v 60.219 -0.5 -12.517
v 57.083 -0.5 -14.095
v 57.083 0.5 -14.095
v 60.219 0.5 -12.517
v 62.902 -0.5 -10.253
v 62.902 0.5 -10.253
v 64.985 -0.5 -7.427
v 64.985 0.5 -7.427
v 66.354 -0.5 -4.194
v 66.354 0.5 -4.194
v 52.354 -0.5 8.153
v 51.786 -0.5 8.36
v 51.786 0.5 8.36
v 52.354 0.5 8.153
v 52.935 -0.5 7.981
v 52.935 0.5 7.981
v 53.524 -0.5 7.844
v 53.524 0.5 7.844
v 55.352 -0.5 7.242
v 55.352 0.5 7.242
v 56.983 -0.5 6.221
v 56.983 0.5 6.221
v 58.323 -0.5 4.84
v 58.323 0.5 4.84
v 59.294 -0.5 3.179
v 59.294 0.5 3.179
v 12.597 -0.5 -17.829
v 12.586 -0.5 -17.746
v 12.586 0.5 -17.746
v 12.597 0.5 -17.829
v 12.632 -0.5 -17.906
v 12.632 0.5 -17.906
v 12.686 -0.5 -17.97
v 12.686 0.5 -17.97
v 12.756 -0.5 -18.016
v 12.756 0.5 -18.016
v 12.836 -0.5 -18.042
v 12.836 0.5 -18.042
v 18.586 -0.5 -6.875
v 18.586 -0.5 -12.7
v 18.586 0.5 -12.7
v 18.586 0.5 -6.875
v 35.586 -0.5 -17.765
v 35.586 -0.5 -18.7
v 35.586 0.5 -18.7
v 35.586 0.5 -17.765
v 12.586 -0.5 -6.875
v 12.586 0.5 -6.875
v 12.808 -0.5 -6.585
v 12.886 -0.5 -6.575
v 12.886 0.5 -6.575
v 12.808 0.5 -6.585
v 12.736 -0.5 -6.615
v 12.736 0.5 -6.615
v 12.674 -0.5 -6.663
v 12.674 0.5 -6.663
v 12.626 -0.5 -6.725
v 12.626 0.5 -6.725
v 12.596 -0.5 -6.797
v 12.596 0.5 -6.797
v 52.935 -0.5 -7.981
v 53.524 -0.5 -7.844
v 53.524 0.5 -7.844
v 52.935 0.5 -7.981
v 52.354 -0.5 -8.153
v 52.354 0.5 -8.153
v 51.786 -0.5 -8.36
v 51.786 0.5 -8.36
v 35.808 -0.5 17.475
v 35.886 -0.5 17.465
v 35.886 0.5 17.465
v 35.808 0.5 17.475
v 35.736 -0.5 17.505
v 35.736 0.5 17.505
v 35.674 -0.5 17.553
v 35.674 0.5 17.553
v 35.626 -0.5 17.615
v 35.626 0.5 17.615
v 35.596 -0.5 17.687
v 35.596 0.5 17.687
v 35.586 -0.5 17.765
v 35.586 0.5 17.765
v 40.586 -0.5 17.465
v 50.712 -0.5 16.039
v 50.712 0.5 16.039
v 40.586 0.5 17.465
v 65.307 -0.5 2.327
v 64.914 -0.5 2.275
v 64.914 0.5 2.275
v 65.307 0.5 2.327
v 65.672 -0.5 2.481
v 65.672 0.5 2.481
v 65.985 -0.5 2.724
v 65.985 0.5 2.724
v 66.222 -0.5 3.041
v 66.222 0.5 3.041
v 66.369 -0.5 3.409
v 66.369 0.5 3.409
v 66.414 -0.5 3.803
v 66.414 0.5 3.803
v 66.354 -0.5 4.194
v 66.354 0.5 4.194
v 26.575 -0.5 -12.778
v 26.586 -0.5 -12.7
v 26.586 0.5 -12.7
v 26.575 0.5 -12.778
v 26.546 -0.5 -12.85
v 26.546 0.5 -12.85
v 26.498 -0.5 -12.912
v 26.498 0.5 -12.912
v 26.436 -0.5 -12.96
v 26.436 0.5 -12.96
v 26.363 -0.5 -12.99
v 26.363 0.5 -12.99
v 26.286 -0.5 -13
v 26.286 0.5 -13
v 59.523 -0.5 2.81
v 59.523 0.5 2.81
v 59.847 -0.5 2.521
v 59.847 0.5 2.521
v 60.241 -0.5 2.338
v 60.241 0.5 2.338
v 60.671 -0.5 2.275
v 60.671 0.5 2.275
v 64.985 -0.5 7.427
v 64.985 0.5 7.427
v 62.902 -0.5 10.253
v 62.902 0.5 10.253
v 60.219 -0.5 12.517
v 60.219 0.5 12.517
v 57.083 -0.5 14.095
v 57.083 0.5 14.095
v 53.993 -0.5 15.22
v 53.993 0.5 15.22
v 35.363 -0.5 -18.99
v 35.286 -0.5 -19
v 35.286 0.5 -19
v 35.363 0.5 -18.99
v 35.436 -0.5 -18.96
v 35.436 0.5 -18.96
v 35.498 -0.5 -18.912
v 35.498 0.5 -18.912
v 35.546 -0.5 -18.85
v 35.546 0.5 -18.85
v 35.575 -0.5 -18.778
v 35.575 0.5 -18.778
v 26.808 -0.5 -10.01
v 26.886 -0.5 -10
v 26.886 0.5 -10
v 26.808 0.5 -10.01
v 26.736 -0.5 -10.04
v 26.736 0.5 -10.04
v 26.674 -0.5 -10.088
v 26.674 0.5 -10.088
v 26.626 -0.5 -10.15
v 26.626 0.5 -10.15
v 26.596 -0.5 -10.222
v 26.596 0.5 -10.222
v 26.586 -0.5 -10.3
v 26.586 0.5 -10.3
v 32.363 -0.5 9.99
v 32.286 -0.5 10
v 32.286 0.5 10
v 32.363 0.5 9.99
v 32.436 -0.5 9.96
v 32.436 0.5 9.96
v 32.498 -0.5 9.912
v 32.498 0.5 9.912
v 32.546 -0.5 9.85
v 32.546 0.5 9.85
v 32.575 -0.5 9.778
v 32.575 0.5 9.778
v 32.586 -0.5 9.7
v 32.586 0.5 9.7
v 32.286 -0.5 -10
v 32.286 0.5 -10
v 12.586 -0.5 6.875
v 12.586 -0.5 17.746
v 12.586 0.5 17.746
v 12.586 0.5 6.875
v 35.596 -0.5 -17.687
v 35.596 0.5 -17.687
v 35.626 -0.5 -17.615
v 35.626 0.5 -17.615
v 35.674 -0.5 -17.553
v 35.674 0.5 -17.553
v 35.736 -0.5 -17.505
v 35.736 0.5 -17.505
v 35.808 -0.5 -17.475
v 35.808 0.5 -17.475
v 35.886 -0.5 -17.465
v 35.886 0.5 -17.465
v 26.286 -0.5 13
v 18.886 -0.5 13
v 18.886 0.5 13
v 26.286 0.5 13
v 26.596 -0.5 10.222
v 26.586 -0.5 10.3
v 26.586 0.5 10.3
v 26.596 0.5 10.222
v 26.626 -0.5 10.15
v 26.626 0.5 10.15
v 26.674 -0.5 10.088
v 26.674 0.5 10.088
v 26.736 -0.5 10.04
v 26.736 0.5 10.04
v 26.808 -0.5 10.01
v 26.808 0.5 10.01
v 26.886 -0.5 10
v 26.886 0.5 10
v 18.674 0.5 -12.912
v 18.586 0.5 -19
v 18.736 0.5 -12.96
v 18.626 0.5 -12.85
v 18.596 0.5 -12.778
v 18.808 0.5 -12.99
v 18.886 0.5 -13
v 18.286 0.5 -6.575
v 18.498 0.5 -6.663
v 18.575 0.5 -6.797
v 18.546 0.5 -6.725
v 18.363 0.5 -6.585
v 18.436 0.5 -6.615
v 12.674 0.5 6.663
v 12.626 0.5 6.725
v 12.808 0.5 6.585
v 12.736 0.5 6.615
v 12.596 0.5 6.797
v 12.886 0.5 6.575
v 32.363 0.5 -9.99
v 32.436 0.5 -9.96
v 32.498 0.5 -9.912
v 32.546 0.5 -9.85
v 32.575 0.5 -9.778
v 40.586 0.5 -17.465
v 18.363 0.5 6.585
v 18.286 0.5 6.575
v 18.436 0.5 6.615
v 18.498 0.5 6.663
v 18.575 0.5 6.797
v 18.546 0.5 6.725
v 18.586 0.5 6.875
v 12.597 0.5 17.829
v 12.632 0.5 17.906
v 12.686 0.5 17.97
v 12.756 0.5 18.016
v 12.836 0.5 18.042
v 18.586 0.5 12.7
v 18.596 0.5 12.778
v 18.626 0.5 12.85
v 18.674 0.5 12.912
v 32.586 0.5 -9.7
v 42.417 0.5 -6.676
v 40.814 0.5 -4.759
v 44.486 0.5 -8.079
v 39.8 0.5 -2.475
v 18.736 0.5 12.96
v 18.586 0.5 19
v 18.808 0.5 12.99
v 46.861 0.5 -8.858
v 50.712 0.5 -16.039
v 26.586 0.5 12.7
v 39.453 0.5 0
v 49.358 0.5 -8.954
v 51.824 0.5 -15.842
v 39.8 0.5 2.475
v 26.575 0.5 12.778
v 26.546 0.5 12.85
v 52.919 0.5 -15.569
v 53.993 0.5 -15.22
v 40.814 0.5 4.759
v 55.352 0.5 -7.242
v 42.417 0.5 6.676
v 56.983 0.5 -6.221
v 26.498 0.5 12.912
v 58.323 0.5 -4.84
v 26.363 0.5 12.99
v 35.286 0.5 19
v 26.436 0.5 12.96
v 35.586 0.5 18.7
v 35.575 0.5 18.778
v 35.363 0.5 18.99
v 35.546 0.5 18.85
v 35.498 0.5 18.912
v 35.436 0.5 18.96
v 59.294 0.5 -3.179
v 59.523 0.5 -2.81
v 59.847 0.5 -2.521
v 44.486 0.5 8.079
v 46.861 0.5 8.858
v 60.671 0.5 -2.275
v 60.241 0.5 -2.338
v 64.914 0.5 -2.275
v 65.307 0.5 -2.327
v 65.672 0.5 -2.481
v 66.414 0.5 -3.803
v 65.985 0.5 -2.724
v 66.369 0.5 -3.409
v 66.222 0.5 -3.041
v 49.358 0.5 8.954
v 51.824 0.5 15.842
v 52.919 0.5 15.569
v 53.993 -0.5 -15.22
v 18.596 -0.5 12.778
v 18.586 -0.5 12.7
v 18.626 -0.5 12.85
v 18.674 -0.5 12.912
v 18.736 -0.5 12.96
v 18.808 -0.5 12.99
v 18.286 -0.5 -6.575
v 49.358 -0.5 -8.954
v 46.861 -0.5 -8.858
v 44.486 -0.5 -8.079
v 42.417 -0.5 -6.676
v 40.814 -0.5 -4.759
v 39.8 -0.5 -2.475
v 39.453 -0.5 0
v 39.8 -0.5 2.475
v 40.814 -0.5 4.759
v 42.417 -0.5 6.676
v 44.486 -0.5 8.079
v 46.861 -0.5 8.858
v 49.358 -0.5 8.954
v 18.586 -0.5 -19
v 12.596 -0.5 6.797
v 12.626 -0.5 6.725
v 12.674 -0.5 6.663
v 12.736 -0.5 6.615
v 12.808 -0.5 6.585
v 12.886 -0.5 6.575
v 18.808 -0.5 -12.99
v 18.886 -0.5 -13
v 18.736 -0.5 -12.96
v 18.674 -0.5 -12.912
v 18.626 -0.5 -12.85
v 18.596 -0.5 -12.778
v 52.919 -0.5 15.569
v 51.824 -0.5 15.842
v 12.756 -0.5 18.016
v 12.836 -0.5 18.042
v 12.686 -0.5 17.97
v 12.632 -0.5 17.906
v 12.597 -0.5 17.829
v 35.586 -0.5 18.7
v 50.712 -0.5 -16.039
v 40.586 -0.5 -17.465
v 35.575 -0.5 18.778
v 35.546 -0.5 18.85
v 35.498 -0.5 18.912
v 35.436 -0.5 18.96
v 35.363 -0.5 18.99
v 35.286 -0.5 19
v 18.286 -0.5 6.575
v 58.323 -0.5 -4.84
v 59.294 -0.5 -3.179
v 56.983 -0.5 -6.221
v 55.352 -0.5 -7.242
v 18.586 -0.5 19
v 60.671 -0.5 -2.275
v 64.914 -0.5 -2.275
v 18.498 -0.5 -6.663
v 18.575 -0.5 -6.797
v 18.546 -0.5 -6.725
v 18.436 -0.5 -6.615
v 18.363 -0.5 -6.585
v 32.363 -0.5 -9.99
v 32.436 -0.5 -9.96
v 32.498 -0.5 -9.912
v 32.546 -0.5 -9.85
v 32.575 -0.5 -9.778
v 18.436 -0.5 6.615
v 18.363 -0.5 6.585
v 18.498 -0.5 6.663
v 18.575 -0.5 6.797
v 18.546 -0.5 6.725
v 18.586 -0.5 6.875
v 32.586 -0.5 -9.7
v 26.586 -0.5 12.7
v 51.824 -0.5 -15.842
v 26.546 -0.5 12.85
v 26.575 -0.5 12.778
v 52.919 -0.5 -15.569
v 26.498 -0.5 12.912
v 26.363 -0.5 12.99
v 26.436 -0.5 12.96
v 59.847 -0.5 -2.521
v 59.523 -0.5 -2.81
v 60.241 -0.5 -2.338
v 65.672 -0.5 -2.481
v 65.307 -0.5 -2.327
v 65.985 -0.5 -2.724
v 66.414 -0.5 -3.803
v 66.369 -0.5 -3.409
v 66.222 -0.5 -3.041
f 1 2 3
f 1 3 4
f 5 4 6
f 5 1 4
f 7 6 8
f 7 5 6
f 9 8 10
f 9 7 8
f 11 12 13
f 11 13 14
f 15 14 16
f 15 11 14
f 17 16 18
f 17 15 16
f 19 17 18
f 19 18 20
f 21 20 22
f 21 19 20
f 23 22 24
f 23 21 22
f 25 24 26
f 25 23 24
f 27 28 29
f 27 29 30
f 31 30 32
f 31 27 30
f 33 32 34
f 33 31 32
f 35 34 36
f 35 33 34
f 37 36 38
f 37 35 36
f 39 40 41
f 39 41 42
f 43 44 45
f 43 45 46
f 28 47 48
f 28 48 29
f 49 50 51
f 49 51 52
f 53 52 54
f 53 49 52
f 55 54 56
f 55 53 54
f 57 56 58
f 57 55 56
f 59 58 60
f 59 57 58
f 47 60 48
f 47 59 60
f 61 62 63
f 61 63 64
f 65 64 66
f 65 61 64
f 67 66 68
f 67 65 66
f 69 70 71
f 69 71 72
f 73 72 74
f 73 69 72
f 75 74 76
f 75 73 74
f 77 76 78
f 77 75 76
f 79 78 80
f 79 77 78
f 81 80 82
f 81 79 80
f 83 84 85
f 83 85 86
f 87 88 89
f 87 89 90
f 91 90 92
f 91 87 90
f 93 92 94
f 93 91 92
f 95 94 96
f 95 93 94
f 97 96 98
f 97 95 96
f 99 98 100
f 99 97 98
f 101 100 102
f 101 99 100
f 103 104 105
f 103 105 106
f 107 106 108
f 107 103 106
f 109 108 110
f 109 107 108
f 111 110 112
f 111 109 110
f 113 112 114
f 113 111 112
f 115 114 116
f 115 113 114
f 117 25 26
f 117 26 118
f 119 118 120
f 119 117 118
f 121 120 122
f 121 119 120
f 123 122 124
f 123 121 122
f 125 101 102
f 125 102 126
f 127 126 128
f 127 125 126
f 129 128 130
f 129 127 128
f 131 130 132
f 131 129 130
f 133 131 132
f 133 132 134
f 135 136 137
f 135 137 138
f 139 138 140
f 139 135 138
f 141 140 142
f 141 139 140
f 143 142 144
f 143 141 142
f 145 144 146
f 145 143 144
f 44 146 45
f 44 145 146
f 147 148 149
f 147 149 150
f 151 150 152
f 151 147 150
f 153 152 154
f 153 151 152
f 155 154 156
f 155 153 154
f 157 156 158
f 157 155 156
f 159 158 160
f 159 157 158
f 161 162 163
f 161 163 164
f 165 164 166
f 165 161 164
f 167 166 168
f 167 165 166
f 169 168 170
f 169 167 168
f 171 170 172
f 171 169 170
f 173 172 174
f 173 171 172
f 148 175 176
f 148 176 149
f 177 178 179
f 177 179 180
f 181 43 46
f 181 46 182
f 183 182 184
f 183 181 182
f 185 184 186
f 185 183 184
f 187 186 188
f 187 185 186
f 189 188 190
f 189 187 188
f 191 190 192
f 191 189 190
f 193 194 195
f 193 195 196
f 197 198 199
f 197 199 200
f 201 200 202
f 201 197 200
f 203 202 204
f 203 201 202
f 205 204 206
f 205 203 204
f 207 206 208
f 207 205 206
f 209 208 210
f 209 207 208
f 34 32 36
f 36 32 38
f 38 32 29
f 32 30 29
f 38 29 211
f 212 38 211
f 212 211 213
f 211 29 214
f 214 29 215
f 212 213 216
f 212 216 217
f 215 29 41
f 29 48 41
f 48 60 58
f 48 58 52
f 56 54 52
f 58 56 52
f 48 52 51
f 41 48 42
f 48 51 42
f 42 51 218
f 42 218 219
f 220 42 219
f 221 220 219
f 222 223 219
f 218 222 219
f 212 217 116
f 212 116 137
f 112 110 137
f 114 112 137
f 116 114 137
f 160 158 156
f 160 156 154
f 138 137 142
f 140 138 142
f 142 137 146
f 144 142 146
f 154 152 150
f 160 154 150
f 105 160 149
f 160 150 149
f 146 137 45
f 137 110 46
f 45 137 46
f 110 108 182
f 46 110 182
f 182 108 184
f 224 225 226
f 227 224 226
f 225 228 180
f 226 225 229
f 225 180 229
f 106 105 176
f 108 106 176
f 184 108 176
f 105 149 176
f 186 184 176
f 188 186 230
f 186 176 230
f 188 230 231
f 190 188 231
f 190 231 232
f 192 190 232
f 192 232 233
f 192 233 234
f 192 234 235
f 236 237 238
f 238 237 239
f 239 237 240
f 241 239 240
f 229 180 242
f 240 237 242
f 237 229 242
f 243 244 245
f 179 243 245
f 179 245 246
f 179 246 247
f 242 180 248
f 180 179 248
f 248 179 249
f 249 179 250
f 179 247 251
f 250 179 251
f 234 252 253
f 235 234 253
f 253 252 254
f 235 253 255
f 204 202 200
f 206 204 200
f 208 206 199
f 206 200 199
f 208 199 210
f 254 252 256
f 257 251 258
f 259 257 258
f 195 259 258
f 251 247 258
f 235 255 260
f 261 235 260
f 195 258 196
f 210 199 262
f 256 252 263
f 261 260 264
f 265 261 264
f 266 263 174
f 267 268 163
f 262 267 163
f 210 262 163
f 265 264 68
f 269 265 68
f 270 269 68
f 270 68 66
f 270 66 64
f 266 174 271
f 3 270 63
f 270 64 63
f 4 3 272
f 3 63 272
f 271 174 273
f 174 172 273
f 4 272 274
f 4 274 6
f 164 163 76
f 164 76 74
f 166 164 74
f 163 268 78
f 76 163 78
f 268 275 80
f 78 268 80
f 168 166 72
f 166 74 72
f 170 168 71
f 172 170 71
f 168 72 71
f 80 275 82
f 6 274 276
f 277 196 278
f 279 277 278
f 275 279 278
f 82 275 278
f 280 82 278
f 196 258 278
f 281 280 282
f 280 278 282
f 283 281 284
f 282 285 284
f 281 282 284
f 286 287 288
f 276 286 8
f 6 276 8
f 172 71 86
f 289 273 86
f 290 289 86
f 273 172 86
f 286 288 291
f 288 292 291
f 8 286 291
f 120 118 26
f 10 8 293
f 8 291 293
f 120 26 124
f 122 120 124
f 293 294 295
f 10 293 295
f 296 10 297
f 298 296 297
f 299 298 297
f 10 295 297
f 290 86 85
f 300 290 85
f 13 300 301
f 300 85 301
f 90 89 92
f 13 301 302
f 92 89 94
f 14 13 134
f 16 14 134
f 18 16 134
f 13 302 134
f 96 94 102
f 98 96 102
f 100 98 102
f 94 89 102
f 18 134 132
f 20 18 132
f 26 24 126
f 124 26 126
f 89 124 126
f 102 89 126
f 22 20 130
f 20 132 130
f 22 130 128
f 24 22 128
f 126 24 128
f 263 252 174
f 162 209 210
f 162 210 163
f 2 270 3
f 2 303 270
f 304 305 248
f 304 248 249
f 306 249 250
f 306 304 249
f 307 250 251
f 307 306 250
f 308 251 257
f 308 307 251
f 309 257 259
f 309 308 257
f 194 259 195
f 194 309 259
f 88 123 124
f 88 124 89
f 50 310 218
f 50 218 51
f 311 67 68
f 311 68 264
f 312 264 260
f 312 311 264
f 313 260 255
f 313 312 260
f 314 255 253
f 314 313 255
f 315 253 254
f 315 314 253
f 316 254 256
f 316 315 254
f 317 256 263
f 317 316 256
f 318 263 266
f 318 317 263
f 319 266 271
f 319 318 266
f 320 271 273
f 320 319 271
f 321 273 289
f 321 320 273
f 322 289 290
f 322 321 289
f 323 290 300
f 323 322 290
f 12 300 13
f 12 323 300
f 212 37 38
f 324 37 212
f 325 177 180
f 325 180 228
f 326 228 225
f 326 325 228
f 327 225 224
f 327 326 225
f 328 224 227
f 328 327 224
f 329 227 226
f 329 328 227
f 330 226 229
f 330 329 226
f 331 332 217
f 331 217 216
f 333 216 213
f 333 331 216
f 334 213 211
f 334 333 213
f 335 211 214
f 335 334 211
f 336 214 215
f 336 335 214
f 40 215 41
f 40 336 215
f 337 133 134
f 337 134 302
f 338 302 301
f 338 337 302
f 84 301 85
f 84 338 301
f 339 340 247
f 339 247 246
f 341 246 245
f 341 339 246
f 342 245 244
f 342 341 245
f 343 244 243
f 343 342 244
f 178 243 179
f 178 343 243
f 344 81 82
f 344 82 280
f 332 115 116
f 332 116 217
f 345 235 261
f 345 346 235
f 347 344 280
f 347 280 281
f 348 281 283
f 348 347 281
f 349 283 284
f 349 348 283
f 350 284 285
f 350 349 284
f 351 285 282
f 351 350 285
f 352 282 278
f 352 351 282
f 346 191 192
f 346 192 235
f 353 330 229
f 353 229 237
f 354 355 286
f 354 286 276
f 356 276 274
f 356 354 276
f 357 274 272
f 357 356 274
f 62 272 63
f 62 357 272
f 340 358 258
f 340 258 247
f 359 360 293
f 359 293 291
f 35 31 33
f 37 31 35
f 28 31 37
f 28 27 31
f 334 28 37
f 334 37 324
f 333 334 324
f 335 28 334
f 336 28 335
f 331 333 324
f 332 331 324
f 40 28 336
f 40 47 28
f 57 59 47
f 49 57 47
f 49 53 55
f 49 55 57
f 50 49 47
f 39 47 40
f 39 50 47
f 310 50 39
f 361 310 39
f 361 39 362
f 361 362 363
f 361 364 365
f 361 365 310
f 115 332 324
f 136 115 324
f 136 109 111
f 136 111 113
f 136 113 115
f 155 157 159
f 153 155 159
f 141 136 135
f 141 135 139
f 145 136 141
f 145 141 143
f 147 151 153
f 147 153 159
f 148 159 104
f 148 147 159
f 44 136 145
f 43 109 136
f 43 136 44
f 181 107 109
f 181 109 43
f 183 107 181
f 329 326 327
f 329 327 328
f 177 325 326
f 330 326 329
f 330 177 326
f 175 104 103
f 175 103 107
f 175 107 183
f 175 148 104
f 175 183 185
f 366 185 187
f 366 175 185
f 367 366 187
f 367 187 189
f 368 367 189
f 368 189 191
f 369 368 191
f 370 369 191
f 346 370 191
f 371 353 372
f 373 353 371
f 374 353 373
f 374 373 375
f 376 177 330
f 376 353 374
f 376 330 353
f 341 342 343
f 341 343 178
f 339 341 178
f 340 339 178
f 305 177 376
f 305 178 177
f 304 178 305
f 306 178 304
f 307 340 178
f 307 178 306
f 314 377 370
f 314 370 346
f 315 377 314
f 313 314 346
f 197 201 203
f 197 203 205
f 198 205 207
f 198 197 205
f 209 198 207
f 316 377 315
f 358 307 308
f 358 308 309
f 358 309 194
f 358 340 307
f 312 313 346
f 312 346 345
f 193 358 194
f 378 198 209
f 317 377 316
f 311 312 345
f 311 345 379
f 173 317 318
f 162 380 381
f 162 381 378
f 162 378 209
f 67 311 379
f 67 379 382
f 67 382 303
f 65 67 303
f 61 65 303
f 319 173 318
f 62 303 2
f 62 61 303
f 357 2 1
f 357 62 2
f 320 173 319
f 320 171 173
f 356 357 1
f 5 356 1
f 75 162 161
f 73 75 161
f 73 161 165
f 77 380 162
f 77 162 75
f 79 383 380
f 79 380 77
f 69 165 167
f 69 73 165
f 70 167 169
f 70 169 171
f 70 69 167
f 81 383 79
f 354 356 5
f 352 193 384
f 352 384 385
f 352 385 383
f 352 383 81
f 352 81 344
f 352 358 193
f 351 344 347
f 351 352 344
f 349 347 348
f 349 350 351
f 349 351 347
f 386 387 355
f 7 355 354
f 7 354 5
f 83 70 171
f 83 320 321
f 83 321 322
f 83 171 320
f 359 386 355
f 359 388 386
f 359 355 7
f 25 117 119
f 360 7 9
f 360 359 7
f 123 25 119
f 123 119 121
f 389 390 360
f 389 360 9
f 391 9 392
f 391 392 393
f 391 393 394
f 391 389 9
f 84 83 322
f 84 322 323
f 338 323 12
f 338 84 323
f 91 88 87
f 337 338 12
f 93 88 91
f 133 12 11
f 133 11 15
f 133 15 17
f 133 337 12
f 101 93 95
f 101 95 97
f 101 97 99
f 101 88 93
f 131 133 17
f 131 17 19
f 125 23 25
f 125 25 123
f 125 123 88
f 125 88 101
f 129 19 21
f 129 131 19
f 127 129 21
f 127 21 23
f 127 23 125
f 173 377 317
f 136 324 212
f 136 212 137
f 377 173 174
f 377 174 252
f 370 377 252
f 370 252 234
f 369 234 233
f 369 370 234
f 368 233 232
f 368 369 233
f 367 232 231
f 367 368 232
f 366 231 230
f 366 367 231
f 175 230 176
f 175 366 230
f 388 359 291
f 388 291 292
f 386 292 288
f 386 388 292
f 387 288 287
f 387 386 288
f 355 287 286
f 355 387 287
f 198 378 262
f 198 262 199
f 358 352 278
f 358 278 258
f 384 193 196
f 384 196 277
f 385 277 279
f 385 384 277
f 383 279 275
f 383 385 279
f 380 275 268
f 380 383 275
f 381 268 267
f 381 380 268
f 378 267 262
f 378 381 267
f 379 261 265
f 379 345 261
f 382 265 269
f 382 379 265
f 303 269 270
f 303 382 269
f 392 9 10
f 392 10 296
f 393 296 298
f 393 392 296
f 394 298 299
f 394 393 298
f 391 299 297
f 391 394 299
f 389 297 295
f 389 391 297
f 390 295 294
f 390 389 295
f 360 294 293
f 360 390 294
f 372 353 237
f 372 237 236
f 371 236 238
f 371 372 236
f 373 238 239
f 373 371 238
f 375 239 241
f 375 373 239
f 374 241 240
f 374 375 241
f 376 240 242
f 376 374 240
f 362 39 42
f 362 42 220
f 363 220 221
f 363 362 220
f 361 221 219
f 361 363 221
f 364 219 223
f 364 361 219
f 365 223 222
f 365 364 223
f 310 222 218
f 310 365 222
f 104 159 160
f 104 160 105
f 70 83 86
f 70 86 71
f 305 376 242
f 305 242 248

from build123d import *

# Parameters (mm, degrees)
F1_DEPTH = 0.5


# Not quite as in the source:
# - ends of sketch curves that miss each other by under 0.0002 mm in the source are joined


with BuildPart() as f1:
    # F0 (on Front) → F1 (new body, symmetric)
    with BuildSketch(Plane.XZ):
        with BuildLine():
            Line((53.992555, -15.220268), (57.083133, -14.095389))
            ThreePointArc((57.083133, -14.095389), (62.9018568836, -10.252747544), (66.3544503107, -4.1944440905))
            ThreePointArc((66.3544503107, -4.1944440905), (66.1141142416, -2.8747683688), (64.914288, -2.275))
            Line((64.914288, -2.275), (60.670593, -2.275))
            ThreePointArc((60.670593, -2.275), (59.8472095147, -2.5211899521), (59.2941043505, -3.1789471518))
            ThreePointArc((59.2941043505, -3.1789471518), (56.9827494729, -6.2209259886), (53.52425904, -7.8441451998))
            ThreePointArc((53.52425904, -7.8441451998), (52.6431740995, -8.0626756758), (51.7855370008, -8.3602070021))
            ThreePointArc((51.7855370008, -8.3602070021), (39.452831, 0), (51.7855371982, 8.3602074972))
            ThreePointArc((51.7855371982, 8.3602074972), (52.6431743712, 8.0626765952), (53.524259133, 7.844145664))
            ThreePointArc((53.524259133, 7.844145664), (56.9827494729, 6.2209259886), (59.2941043849, 3.1789471667))
            ThreePointArc((59.2941043849, 3.1789471667), (59.8472095147, 2.5211899521), (60.670593, 2.275))
            Line((60.670593, 2.275), (64.914288, 2.275))
            ThreePointArc((64.914288, 2.275), (66.1141145297, 2.8747687527), (66.3544497778, 4.1944449353))
            ThreePointArc((66.3544497778, 4.1944449353), (62.9018565554, 10.2527478944), (57.0831331177, 14.0953893235))
            Line((57.0831331177, 14.0953893235), (53.992555, 15.220268))
            ThreePointArc((53.992555, 15.220268), (52.3736165632, 15.715360306), (50.7118440801, 16.0387645685))
            Line((50.7118440801, 16.0387645685), (40.585713, 17.465))
            Line((40.585713, 17.465), (35.885713, 17.465))
            ThreePointArc((35.885713, 17.465), (35.6735809656, 17.5528679656), (35.585713, 17.765))
            Line((35.585713, 17.765), (35.585713, 18.7))
            ThreePointArc((35.585713, 18.7), (35.4978450344, 18.9121320344), (35.285713, 19))
            Line((35.285713, 19), (18.585713, 19))
            Line((18.585713, 19), (12.836393, 18.04178))
            ThreePointArc((12.836393, 18.04178), (12.656806899, 17.9397743434), (12.585713, 17.745862))
            Line((12.585713, 17.745862), (12.585713, 6.875))
            ThreePointArc((12.585713, 6.875), (12.6735809656, 6.6628679656), (12.885713, 6.575))
            Line((12.885713, 6.575), (18.285713, 6.575))
            ThreePointArc((18.285713, 6.575), (18.4978450344, 6.6628679656), (18.585713, 6.875))
            Line((18.585713, 6.875), (18.585713, 12.7))
            ThreePointArc((18.585713, 12.7), (18.6735809656, 12.9121320344), (18.885713, 13))
            Line((18.885713, 13), (26.285713, 13))
            ThreePointArc((26.285713, 13), (26.4978450344, 12.9121320344), (26.585713, 12.7))
            Line((26.585713, 12.7), (26.585713, 10.3))
            ThreePointArc((26.585713, 10.3), (26.6735809656, 10.0878679656), (26.885713, 10))
            Line((26.885713, 10), (32.285713, 10))
            ThreePointArc((32.285713, 10), (32.4978450344, 9.9121320344), (32.585713, 9.7))
            Line((32.585713, 9.7), (32.585713, -9.7))
            ThreePointArc((32.585713, -9.7), (32.4978450344, -9.9121320344), (32.285713, -10))
            Line((32.285713, -10), (26.885713, -10))
            ThreePointArc((26.885713, -10), (26.6735809656, -10.0878679656), (26.585713, -10.3))
            Line((26.585713, -10.3), (26.585713, -12.7))
            ThreePointArc((26.585713, -12.7), (26.4978450344, -12.9121320344), (26.285713, -13))
            Line((26.285713, -13), (18.885713, -13))
            ThreePointArc((18.885713, -13), (18.6735809656, -12.9121320344), (18.585713, -12.7))
            Line((18.585713, -12.7), (18.585713, -6.875))
            ThreePointArc((18.585713, -6.875), (18.4978450344, -6.6628679656), (18.285713, -6.575))
            Line((18.285713, -6.575), (12.885713, -6.575))
            ThreePointArc((12.885713, -6.575), (12.6735809656, -6.6628679656), (12.585713, -6.875))
            Line((12.585713, -6.875), (12.585713, -17.745862))
            ThreePointArc((12.585713, -17.745862), (12.656806899, -17.9397743434), (12.8363929795, -18.0417801231))
            Line((12.8363929795, -18.0417801231), (18.585713, -19))
            Line((18.585713, -19), (35.285713, -19))
            ThreePointArc((35.285713, -19), (35.4978450344, -18.9121320344), (35.585713, -18.7))
            Line((35.585713, -18.7), (35.585713, -17.765))
            ThreePointArc((35.585713, -17.765), (35.6735809656, -17.5528679656), (35.885713, -17.465))
            Line((35.885713, -17.465), (40.585713, -17.465))
            Line((40.585713, -17.465), (50.711844, -16.038764))
            ThreePointArc((50.711844, -16.038764), (52.3736165632, -15.715360306), (53.992555, -15.220268))
        make_face()
    extrude(amount=F1_DEPTH, both=True)


solid = f1.part
